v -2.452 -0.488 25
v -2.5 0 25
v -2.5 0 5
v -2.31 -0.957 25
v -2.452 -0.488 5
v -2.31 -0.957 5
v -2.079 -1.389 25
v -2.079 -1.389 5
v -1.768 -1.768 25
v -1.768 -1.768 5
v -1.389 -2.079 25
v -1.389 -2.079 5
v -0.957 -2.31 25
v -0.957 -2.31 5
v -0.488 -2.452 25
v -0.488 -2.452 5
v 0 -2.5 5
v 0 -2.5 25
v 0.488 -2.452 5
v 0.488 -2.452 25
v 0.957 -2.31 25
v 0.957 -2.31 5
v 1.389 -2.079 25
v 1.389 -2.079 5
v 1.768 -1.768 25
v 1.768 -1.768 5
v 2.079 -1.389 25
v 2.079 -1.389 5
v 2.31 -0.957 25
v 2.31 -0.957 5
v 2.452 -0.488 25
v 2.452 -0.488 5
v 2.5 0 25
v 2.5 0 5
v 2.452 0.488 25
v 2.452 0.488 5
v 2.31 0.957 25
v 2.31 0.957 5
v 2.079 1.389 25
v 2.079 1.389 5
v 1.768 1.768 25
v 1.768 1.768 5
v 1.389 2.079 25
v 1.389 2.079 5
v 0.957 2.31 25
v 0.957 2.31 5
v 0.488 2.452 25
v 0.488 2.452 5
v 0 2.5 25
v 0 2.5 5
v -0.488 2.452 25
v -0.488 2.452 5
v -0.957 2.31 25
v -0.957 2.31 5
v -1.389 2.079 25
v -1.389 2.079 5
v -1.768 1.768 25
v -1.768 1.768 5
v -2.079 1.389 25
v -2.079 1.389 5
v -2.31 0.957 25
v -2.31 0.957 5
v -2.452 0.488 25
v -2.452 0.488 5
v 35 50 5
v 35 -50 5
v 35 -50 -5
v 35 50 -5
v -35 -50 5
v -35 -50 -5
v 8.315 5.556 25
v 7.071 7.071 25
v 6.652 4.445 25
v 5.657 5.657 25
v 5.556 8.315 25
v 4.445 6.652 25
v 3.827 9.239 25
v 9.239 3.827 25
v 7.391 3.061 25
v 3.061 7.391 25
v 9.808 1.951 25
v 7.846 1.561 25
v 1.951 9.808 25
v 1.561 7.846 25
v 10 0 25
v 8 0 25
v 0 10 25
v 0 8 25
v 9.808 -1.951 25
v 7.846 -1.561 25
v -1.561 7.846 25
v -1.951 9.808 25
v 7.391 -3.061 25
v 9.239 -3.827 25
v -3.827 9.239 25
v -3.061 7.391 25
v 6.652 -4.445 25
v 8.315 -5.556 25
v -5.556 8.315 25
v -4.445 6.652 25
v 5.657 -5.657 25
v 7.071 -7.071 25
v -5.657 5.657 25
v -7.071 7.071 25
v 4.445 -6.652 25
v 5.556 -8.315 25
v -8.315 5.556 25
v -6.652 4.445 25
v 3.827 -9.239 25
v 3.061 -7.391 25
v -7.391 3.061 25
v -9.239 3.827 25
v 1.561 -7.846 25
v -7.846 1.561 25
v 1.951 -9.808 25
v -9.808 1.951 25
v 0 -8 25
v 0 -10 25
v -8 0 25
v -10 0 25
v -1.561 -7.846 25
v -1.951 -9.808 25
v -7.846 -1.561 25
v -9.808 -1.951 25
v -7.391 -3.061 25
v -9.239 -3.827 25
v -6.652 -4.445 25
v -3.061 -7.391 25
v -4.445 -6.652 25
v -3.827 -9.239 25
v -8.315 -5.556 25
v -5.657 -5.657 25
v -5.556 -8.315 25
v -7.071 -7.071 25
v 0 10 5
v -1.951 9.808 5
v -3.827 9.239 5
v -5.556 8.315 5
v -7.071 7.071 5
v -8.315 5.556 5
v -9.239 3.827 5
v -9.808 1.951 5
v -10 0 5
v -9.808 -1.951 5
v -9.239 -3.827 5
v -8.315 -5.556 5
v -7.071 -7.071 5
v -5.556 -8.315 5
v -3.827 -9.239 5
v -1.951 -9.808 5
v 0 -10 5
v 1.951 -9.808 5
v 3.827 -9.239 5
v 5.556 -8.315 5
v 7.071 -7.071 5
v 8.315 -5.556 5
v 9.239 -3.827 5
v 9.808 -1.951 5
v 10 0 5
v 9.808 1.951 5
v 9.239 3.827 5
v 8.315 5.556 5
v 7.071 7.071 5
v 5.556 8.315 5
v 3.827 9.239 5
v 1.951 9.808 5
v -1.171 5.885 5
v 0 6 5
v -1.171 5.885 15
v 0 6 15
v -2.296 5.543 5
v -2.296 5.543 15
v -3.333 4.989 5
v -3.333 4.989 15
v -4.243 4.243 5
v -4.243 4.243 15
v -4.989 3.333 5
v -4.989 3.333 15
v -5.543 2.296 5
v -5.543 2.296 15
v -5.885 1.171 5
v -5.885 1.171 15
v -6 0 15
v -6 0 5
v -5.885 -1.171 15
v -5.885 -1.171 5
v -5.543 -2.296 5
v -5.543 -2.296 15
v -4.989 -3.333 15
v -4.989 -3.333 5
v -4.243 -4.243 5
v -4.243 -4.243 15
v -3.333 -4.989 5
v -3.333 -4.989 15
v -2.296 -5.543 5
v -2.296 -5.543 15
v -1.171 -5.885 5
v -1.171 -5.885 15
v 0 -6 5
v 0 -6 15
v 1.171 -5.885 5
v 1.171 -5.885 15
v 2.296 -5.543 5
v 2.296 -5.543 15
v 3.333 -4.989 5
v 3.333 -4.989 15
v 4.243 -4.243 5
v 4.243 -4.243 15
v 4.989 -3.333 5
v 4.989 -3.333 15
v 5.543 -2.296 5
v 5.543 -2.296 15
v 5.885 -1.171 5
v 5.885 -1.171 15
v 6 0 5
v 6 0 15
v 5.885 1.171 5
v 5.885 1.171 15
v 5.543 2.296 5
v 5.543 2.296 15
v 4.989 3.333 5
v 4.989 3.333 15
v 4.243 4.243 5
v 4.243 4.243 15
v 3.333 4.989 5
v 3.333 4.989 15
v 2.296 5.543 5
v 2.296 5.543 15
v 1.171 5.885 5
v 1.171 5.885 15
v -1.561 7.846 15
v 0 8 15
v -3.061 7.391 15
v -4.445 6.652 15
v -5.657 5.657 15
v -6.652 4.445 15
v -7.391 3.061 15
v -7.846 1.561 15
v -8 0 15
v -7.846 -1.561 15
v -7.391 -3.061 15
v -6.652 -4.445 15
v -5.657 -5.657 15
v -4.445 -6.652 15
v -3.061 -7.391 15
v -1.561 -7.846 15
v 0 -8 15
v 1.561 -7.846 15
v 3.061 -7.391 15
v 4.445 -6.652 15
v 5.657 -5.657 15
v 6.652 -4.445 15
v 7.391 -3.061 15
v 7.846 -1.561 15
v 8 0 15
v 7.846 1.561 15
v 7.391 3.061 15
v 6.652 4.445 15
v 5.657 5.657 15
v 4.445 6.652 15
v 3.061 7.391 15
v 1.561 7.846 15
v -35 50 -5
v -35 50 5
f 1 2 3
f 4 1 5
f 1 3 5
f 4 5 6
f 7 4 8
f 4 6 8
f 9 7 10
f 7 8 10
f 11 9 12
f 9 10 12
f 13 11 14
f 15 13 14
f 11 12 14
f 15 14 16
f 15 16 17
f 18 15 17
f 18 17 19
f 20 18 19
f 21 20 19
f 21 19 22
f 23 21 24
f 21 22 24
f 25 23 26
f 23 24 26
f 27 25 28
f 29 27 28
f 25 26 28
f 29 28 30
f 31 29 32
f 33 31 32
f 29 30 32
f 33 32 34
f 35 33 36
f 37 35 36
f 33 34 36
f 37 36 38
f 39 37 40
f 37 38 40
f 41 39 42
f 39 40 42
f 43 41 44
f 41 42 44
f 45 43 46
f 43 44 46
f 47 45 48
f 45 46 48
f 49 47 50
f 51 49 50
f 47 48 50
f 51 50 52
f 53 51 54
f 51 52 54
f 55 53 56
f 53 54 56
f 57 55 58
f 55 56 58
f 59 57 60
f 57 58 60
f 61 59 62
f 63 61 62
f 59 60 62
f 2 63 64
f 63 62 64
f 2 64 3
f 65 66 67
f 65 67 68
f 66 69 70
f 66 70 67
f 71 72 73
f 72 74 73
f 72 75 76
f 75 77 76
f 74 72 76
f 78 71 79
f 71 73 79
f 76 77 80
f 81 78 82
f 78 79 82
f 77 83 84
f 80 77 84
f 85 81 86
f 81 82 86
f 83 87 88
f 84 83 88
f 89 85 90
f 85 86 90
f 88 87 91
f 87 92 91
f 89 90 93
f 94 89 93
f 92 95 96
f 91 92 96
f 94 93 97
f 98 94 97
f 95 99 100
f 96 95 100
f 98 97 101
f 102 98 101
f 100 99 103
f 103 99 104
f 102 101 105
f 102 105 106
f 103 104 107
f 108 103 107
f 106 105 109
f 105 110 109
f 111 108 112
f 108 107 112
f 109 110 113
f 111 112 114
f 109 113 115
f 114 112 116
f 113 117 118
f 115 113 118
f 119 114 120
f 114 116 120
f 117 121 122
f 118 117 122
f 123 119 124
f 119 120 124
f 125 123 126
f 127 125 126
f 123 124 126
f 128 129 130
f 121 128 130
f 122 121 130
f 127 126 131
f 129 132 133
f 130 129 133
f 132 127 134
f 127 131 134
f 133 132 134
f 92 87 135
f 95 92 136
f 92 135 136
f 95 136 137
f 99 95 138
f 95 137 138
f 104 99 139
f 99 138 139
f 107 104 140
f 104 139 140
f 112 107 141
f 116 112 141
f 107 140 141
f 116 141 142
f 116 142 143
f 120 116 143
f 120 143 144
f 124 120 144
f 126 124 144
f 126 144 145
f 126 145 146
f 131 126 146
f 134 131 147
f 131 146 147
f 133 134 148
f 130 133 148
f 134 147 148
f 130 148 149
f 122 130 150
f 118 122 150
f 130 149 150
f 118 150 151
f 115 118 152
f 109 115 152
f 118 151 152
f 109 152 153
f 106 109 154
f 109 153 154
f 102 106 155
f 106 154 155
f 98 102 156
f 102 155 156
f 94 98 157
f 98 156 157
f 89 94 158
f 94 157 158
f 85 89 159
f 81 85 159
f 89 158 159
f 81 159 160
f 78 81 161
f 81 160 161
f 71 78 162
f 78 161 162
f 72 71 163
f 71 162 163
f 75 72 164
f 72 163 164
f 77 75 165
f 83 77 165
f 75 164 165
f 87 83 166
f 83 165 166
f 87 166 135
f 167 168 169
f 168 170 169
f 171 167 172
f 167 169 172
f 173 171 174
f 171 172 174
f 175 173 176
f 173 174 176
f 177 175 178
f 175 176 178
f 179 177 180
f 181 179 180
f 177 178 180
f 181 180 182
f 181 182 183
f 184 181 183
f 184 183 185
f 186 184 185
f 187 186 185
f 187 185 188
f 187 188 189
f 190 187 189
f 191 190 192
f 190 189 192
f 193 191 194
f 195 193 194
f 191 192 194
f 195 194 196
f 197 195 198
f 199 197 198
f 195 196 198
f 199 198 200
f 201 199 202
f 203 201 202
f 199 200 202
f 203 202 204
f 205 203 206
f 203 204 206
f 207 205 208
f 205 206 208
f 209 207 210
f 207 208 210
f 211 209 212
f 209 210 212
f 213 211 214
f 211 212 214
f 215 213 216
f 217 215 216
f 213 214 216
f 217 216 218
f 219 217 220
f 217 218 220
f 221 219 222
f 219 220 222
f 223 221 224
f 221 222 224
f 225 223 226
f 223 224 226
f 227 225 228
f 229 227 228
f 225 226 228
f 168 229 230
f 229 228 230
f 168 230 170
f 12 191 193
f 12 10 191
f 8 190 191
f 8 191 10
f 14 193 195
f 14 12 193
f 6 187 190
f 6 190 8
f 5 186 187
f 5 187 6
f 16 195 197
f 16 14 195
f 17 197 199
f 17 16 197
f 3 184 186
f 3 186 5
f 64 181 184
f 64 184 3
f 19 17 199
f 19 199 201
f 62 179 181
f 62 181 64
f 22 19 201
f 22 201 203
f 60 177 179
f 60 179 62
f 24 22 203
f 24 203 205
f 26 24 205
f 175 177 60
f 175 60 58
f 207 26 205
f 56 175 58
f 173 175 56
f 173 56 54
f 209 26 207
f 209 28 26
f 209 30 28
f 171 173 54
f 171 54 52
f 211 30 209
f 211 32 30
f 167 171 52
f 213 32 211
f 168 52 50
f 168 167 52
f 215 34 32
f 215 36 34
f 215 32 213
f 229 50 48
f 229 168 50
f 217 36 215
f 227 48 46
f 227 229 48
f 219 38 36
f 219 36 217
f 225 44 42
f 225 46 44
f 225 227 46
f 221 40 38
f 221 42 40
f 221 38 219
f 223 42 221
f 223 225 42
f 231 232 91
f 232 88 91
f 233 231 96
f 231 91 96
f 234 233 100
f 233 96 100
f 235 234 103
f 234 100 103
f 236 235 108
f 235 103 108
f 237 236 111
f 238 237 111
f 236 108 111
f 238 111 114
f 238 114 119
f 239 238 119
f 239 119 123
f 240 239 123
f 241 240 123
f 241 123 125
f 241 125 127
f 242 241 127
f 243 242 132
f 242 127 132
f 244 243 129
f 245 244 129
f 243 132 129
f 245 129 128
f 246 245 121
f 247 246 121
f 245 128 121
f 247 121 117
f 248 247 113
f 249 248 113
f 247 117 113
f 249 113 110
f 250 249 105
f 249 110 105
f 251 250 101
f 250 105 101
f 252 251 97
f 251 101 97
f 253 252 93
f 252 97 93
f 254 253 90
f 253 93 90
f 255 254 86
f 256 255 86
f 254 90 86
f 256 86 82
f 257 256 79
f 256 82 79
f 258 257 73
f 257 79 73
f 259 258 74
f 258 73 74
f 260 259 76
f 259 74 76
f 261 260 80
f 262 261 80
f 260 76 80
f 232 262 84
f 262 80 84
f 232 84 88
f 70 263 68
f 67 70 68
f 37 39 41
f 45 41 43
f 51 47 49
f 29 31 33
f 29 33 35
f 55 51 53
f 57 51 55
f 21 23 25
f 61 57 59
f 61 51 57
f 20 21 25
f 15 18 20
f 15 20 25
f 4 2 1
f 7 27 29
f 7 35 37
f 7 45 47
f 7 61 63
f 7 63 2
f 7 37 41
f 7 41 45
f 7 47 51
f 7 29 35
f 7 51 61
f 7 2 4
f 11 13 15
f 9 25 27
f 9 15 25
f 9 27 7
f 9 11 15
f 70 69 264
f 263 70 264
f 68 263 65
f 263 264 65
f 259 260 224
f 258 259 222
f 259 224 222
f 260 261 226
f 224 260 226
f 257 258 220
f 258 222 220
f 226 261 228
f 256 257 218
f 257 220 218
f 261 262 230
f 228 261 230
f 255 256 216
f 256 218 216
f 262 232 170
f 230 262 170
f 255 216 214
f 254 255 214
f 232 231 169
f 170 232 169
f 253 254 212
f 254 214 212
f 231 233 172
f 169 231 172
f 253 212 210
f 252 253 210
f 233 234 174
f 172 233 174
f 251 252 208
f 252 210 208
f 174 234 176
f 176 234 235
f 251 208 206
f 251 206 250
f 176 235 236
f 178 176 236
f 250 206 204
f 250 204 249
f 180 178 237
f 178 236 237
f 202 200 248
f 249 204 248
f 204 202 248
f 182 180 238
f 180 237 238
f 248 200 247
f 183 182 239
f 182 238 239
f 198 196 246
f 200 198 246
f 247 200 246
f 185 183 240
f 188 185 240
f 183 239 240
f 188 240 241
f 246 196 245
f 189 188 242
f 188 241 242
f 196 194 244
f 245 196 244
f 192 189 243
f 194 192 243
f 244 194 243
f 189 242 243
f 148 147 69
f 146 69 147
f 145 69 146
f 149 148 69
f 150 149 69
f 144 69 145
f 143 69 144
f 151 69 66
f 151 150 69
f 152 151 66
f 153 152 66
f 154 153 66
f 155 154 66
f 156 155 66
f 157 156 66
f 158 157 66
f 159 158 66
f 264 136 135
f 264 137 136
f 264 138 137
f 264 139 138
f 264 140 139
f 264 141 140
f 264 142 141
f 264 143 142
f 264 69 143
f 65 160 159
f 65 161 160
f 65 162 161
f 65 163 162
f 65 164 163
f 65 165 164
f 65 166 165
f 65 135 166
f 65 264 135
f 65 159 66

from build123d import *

# Parameters (mm, degrees)
SKETCH1_W           = 70
SKETCH1_H           = 100
BOSS_EXTRUDE1_DEPTH = 5
SKETCH3_R           = 2.5
BOSS_EXTRUDE2_DEPTH = 20


with BuildPart() as part:
    # Sketch1 → Boss-Extrude1 (new, symmetric)
    with BuildSketch(Plane.XY):
        Rectangle(SKETCH1_W, SKETCH1_H)
    extrude(amount=BOSS_EXTRUDE1_DEPTH, both=True)

    # Sketch3 → Boss-Extrude2 (add)
    with BuildSketch(Plane.XY.offset(5)):
        with Locations(Location((0, 0, 0), (0, 0, 180))):
            Circle(SKETCH3_R)
    extrude(amount=BOSS_EXTRUDE2_DEPTH)

    # Sketch5 → Revolve1 (revolve)
    with BuildSketch(Plane(origin=(0, 0, 0), x_dir=(0, 0, -1), z_dir=(1, 0, 0))):
        Polygon((-5, 6), (-15, 6), (-15, 8), (-25, 8), (-25, 10), (-5, 10), align=None)
    revolve(axis=Axis((0, 0, 0), (0, 0, 1)))


solid = part.part
